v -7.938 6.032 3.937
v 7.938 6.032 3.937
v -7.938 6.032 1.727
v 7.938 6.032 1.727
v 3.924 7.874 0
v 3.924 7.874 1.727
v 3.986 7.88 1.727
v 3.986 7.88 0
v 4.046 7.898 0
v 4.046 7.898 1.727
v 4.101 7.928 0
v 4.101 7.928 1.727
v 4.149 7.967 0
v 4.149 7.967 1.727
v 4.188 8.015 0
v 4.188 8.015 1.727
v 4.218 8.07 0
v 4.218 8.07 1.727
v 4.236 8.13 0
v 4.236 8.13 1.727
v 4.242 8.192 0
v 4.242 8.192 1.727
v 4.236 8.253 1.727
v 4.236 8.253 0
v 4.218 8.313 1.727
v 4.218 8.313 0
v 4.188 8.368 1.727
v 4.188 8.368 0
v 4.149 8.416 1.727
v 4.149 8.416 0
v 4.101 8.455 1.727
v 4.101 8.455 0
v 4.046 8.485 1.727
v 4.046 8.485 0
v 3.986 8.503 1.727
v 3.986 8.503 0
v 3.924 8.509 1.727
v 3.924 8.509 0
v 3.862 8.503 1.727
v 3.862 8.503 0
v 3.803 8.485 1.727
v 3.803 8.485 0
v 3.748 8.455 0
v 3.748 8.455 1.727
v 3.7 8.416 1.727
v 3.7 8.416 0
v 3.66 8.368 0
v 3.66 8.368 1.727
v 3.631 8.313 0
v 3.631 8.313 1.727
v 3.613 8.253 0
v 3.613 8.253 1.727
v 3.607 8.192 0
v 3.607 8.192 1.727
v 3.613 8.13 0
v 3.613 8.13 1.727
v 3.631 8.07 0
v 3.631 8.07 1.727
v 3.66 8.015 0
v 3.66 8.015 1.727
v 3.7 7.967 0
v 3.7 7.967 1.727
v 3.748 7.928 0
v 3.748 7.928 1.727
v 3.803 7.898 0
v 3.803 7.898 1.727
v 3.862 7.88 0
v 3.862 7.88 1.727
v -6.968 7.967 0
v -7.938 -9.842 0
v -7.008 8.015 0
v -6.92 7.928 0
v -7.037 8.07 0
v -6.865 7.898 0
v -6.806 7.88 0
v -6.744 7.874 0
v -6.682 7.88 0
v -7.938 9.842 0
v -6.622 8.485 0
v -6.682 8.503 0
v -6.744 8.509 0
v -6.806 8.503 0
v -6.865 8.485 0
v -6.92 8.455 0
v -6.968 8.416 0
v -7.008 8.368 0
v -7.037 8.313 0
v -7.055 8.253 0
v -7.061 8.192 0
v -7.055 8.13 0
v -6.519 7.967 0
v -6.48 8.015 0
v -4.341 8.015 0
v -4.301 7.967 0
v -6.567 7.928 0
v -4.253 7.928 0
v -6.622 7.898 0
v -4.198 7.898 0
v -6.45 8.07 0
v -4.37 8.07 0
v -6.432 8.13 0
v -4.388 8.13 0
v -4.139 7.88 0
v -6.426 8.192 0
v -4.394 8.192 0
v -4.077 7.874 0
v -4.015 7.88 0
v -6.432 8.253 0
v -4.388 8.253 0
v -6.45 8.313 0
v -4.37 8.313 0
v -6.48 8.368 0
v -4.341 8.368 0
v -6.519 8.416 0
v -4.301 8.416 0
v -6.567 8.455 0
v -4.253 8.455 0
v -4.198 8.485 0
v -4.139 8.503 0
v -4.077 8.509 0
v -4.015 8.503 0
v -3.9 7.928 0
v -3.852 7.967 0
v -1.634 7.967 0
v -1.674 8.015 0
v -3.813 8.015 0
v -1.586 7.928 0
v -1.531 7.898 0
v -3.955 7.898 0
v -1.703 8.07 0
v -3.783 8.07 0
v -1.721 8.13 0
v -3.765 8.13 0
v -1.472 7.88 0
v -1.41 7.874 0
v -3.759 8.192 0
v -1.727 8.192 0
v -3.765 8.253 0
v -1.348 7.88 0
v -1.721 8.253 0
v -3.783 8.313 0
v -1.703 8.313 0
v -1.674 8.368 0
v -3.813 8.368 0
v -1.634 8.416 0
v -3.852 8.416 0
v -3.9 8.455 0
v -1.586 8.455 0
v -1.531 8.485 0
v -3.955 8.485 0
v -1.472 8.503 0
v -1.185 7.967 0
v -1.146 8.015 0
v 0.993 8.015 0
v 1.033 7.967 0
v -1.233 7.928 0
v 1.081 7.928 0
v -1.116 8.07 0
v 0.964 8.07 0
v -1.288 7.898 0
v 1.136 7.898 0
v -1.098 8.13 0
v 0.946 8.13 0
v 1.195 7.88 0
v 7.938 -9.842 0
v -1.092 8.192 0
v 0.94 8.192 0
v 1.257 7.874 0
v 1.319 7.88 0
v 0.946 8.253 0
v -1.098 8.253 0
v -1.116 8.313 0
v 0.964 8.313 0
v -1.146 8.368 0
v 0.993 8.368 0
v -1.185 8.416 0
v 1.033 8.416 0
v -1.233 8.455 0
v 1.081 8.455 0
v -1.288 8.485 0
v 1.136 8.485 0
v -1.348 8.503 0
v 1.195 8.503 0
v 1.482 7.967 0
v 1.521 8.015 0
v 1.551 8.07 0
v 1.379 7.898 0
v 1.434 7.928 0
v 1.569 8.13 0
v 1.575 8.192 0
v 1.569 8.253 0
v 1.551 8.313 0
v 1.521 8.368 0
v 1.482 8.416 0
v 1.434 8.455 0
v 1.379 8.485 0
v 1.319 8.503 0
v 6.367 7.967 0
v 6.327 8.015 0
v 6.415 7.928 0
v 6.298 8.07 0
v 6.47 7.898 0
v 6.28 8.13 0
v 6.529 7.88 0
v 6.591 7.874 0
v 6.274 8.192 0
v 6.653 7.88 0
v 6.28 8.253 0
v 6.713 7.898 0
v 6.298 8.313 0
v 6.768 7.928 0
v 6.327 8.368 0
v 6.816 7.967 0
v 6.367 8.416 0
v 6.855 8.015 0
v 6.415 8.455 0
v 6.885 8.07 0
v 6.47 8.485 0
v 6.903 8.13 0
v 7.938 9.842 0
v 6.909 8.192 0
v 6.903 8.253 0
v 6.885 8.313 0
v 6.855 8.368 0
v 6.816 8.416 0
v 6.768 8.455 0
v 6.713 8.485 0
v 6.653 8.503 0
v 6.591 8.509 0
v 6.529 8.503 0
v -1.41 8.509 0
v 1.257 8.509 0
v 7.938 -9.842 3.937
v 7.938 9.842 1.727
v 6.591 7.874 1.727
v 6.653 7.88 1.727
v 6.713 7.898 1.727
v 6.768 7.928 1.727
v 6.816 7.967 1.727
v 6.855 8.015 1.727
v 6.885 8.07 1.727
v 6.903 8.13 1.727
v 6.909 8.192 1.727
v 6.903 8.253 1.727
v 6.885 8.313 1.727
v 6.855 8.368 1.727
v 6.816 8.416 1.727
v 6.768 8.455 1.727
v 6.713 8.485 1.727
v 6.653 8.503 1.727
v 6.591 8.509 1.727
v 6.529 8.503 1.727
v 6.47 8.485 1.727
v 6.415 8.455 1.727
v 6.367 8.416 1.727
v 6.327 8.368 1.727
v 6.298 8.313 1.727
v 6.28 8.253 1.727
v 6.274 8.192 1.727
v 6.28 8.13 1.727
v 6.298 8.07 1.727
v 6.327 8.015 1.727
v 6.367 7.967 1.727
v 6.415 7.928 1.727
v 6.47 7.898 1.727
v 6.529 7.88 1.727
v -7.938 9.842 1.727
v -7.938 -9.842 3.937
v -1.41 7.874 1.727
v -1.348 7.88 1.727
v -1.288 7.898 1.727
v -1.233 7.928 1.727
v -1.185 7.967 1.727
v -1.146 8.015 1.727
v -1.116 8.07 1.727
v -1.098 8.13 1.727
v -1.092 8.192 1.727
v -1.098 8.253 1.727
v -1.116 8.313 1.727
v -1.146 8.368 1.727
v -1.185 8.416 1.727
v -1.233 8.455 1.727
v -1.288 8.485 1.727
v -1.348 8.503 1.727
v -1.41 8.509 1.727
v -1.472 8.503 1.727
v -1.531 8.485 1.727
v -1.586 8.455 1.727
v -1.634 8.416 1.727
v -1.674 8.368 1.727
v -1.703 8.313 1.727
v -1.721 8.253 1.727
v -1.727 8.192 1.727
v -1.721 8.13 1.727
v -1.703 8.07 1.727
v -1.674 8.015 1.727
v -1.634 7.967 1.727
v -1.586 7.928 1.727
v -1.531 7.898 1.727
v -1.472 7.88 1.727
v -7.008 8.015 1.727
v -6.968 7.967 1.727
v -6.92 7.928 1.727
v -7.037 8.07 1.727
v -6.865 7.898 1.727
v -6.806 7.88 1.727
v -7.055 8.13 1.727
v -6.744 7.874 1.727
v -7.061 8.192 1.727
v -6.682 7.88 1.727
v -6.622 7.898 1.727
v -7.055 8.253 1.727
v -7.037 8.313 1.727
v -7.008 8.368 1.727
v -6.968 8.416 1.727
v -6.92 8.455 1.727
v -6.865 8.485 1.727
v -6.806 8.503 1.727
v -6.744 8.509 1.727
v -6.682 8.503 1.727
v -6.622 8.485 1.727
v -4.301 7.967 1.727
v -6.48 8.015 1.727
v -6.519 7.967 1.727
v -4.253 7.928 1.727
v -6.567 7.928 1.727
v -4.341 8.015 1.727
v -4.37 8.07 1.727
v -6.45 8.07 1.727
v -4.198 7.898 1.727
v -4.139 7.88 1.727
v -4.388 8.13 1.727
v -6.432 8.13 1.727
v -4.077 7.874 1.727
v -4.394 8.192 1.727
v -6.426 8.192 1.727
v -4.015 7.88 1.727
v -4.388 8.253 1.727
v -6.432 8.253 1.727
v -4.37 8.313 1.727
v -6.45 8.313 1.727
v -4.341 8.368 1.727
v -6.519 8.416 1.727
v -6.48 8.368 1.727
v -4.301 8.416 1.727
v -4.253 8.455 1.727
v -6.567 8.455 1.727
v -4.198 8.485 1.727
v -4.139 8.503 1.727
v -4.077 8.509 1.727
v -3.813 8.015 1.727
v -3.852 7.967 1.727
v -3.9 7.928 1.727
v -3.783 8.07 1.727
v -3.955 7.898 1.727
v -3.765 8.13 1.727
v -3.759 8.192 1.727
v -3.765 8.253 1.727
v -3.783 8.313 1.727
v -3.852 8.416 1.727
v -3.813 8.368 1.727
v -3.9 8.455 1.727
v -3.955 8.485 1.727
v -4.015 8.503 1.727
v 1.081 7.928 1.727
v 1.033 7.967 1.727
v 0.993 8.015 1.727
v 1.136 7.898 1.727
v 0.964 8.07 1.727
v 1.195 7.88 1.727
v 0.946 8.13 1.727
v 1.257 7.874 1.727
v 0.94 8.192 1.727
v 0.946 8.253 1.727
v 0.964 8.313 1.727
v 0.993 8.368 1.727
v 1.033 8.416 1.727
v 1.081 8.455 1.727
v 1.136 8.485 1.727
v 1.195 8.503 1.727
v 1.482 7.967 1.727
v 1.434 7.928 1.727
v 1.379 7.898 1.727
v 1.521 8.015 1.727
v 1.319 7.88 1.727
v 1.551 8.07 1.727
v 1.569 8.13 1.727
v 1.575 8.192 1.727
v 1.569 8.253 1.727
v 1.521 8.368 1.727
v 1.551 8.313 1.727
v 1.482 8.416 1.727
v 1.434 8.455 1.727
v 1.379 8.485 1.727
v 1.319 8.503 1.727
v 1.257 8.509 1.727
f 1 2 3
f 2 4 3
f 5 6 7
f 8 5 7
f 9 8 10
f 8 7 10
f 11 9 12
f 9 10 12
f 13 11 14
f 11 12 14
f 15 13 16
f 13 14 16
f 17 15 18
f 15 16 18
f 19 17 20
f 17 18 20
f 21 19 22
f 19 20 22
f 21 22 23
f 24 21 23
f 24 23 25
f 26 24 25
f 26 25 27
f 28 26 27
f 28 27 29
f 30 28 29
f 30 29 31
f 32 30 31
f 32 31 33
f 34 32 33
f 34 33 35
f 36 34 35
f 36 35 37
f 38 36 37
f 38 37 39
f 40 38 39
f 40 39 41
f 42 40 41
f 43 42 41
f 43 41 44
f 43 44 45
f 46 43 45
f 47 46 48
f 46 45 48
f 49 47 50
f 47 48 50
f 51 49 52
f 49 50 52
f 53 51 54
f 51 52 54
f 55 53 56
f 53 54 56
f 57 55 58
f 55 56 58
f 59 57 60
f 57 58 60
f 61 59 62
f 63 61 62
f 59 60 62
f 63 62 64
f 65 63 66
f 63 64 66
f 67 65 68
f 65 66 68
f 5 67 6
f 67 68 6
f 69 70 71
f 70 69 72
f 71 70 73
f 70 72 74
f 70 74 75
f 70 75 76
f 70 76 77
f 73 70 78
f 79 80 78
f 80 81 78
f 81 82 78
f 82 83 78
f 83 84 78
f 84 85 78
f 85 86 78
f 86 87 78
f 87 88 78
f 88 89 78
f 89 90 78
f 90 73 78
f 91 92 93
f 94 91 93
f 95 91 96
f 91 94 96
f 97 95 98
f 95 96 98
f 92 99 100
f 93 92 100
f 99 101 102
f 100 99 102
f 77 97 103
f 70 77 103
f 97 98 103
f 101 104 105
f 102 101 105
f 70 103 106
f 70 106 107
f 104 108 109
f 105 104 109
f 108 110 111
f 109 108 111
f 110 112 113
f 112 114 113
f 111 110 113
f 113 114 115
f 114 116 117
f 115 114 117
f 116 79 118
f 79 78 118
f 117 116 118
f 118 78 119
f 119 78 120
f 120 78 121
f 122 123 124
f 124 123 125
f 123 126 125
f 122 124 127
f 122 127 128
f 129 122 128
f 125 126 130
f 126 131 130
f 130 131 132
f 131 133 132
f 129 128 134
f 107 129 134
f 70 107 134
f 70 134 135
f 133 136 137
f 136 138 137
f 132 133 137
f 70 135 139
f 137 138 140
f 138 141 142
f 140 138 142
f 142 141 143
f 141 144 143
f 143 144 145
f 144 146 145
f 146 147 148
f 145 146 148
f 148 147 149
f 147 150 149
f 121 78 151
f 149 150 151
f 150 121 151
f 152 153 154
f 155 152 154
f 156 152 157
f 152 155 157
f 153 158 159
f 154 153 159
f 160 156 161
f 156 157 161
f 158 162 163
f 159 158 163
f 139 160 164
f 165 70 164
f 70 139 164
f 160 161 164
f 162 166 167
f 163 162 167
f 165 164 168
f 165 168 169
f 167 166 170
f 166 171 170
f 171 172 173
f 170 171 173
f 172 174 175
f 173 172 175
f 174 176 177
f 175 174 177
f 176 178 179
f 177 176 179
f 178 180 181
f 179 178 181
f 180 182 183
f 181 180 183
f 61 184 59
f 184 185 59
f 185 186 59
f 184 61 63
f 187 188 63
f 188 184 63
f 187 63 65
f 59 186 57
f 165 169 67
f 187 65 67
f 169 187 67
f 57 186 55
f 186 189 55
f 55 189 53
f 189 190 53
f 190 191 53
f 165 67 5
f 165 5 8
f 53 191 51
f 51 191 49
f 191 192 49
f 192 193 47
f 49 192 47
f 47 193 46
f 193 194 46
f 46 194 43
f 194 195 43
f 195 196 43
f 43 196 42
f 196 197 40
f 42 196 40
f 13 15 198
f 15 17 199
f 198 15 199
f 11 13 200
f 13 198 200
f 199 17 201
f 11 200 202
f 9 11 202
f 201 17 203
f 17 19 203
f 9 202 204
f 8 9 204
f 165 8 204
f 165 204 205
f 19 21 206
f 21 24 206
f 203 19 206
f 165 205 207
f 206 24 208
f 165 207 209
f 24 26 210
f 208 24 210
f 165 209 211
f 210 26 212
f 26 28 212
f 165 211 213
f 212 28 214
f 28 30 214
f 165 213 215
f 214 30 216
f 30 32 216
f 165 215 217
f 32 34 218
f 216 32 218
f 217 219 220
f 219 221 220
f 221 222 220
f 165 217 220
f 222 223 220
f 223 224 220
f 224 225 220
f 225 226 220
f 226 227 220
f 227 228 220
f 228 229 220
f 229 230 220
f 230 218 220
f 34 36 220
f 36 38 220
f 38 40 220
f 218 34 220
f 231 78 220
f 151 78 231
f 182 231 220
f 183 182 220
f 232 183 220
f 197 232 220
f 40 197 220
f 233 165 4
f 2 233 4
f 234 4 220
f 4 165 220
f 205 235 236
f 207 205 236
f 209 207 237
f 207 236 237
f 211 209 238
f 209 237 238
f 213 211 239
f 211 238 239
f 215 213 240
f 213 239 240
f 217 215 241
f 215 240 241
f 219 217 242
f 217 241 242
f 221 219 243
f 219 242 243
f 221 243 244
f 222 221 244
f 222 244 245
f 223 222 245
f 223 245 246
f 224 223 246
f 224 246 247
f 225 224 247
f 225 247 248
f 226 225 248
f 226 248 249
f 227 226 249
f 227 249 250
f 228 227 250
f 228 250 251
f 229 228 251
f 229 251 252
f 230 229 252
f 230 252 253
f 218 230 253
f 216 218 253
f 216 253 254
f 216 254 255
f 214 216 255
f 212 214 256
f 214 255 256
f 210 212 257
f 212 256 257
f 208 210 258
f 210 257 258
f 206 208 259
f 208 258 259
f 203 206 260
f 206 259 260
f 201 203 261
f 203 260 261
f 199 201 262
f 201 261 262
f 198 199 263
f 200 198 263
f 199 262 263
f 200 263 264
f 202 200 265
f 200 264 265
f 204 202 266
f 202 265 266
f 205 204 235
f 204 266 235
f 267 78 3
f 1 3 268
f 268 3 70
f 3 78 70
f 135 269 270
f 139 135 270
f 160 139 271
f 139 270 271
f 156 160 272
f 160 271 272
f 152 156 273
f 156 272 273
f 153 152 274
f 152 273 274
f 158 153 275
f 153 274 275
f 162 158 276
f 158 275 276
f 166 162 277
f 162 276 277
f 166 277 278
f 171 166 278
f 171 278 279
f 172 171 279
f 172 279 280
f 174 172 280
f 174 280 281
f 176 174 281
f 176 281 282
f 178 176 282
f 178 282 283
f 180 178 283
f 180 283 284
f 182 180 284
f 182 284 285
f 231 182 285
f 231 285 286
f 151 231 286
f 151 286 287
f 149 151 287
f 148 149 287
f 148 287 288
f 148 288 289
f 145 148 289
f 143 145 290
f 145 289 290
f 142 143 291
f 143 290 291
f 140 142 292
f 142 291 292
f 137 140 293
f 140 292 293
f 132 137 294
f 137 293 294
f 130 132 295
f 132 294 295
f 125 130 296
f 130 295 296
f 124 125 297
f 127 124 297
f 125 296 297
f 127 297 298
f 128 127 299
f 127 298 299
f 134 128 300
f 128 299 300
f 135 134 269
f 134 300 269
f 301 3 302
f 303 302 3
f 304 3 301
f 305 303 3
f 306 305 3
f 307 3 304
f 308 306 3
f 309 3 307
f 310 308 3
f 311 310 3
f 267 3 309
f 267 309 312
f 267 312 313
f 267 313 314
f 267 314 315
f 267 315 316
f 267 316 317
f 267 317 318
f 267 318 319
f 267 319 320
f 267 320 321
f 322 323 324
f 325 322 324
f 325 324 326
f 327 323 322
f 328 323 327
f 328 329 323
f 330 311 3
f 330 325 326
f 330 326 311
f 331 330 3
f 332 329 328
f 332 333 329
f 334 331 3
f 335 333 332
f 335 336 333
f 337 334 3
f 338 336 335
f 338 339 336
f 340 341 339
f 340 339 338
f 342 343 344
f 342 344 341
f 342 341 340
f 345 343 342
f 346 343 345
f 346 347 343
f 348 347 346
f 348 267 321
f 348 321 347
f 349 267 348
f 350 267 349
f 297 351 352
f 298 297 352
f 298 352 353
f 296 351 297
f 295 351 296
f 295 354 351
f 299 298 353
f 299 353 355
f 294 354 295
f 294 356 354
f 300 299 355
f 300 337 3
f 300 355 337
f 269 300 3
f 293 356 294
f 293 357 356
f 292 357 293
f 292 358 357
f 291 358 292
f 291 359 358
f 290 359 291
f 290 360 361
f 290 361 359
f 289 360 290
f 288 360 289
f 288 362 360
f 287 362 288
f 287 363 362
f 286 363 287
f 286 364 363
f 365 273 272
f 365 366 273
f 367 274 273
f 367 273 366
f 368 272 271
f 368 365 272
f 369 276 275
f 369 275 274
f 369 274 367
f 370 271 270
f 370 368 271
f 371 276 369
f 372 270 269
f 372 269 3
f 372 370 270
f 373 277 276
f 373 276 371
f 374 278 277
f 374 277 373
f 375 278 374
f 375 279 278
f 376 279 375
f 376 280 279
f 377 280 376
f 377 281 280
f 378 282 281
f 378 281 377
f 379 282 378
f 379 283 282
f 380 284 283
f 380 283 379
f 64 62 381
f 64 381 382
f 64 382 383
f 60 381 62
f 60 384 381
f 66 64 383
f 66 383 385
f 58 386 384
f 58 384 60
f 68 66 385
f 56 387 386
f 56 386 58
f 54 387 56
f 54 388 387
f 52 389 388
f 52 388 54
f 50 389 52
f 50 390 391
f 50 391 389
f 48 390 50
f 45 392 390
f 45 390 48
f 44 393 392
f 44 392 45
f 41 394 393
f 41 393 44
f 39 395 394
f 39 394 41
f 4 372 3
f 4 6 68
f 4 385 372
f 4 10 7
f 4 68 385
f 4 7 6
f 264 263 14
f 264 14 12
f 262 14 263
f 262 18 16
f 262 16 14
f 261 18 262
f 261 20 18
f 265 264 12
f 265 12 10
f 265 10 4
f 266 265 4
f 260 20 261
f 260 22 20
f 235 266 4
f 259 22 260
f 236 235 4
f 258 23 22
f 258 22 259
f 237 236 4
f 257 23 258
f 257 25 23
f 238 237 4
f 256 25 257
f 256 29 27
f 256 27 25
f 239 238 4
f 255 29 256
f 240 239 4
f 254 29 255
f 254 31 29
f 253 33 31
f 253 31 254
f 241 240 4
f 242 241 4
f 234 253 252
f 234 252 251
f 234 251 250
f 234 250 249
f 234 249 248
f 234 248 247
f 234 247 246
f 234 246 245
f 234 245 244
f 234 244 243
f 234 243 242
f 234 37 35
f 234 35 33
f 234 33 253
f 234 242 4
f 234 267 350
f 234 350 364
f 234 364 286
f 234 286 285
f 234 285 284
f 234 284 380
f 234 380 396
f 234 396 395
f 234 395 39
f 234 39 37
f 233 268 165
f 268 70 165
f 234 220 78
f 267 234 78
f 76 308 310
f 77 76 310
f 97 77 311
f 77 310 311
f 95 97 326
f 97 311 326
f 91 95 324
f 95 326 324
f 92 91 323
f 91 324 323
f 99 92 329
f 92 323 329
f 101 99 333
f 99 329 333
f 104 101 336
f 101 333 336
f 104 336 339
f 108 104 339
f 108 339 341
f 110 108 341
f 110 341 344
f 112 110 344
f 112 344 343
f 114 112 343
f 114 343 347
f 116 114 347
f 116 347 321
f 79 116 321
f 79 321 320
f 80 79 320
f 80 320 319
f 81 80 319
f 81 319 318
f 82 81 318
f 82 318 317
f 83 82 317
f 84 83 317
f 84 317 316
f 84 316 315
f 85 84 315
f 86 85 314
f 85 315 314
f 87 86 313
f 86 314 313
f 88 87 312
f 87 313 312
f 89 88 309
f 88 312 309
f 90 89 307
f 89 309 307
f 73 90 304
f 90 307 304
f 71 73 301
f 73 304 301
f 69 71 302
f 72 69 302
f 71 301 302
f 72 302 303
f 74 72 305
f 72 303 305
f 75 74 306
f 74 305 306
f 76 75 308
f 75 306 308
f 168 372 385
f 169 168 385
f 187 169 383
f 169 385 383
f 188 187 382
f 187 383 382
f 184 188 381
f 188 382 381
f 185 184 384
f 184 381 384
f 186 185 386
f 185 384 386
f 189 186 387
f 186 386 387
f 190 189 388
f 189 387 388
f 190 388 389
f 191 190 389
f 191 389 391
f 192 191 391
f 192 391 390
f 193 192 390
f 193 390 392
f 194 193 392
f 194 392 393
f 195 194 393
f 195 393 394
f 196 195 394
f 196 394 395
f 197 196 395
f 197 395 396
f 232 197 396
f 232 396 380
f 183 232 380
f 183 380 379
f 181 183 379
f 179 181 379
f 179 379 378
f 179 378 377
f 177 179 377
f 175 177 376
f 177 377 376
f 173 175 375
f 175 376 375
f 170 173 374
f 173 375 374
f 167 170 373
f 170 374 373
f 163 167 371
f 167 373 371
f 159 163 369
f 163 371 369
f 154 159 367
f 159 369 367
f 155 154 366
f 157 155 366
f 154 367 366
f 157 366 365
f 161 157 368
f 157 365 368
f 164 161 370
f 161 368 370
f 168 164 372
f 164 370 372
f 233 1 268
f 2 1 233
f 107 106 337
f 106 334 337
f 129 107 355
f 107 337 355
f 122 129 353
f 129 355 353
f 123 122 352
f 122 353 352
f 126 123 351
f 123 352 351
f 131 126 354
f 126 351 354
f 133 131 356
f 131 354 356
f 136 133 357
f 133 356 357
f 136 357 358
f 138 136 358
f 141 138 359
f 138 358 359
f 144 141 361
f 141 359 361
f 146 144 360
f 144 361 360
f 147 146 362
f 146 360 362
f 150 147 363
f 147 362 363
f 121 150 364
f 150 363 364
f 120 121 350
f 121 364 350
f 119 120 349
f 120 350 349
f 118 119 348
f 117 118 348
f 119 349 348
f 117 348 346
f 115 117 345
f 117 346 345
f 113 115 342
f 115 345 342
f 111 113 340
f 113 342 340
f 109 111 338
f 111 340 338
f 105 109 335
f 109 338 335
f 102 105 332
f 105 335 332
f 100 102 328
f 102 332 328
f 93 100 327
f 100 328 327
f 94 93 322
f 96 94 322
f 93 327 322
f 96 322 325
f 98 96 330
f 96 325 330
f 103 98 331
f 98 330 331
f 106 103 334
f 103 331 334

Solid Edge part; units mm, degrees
sketch "Sketch1" plane through (0, 0, 0) normal (0, 0, 1) x (1, 0, 0)
  line L0 (7.9375, -9.8425) -> (7.9375, 9.8425)
  line L1 (7.9375, 9.8425) -> (-7.9375, 9.8425)
  line L2 (-7.9375, 9.8425) -> (-7.9375, -9.8425)
  line L3 (-7.9375, -9.8425) -> (7.9375, -9.8425)
extrude "Protrusion1" add sketch "Sketch1" along normal blind 1.7272
sketch "Sketch2" plane through (0, 0, 0) normal (0, 0, 1) x (1, 0, 0)
  line L0 (7.9375, 6.0325) -> (-7.9375, 6.0325)
  line L1 (-7.9375, 6.0325) -> (-7.9375, -9.8425)
  line L2 (-7.9375, -9.8425) -> (7.9375, -9.8425)
  line L3 (7.9375, -9.8425) -> (7.9375, 6.0325)
extrude "ExtrudedProtrusion_2" add sketch "Sketch2" along normal blind 3.937
hole "Hole1" at (-6.7437, 8.1915, 1.7272) direction (0, 0, -1) diameter 0.635 end up to next
pattern_linear "Pattern1" count 6 spacing 2.667 along (1, 0, 0) of "Hole1"
